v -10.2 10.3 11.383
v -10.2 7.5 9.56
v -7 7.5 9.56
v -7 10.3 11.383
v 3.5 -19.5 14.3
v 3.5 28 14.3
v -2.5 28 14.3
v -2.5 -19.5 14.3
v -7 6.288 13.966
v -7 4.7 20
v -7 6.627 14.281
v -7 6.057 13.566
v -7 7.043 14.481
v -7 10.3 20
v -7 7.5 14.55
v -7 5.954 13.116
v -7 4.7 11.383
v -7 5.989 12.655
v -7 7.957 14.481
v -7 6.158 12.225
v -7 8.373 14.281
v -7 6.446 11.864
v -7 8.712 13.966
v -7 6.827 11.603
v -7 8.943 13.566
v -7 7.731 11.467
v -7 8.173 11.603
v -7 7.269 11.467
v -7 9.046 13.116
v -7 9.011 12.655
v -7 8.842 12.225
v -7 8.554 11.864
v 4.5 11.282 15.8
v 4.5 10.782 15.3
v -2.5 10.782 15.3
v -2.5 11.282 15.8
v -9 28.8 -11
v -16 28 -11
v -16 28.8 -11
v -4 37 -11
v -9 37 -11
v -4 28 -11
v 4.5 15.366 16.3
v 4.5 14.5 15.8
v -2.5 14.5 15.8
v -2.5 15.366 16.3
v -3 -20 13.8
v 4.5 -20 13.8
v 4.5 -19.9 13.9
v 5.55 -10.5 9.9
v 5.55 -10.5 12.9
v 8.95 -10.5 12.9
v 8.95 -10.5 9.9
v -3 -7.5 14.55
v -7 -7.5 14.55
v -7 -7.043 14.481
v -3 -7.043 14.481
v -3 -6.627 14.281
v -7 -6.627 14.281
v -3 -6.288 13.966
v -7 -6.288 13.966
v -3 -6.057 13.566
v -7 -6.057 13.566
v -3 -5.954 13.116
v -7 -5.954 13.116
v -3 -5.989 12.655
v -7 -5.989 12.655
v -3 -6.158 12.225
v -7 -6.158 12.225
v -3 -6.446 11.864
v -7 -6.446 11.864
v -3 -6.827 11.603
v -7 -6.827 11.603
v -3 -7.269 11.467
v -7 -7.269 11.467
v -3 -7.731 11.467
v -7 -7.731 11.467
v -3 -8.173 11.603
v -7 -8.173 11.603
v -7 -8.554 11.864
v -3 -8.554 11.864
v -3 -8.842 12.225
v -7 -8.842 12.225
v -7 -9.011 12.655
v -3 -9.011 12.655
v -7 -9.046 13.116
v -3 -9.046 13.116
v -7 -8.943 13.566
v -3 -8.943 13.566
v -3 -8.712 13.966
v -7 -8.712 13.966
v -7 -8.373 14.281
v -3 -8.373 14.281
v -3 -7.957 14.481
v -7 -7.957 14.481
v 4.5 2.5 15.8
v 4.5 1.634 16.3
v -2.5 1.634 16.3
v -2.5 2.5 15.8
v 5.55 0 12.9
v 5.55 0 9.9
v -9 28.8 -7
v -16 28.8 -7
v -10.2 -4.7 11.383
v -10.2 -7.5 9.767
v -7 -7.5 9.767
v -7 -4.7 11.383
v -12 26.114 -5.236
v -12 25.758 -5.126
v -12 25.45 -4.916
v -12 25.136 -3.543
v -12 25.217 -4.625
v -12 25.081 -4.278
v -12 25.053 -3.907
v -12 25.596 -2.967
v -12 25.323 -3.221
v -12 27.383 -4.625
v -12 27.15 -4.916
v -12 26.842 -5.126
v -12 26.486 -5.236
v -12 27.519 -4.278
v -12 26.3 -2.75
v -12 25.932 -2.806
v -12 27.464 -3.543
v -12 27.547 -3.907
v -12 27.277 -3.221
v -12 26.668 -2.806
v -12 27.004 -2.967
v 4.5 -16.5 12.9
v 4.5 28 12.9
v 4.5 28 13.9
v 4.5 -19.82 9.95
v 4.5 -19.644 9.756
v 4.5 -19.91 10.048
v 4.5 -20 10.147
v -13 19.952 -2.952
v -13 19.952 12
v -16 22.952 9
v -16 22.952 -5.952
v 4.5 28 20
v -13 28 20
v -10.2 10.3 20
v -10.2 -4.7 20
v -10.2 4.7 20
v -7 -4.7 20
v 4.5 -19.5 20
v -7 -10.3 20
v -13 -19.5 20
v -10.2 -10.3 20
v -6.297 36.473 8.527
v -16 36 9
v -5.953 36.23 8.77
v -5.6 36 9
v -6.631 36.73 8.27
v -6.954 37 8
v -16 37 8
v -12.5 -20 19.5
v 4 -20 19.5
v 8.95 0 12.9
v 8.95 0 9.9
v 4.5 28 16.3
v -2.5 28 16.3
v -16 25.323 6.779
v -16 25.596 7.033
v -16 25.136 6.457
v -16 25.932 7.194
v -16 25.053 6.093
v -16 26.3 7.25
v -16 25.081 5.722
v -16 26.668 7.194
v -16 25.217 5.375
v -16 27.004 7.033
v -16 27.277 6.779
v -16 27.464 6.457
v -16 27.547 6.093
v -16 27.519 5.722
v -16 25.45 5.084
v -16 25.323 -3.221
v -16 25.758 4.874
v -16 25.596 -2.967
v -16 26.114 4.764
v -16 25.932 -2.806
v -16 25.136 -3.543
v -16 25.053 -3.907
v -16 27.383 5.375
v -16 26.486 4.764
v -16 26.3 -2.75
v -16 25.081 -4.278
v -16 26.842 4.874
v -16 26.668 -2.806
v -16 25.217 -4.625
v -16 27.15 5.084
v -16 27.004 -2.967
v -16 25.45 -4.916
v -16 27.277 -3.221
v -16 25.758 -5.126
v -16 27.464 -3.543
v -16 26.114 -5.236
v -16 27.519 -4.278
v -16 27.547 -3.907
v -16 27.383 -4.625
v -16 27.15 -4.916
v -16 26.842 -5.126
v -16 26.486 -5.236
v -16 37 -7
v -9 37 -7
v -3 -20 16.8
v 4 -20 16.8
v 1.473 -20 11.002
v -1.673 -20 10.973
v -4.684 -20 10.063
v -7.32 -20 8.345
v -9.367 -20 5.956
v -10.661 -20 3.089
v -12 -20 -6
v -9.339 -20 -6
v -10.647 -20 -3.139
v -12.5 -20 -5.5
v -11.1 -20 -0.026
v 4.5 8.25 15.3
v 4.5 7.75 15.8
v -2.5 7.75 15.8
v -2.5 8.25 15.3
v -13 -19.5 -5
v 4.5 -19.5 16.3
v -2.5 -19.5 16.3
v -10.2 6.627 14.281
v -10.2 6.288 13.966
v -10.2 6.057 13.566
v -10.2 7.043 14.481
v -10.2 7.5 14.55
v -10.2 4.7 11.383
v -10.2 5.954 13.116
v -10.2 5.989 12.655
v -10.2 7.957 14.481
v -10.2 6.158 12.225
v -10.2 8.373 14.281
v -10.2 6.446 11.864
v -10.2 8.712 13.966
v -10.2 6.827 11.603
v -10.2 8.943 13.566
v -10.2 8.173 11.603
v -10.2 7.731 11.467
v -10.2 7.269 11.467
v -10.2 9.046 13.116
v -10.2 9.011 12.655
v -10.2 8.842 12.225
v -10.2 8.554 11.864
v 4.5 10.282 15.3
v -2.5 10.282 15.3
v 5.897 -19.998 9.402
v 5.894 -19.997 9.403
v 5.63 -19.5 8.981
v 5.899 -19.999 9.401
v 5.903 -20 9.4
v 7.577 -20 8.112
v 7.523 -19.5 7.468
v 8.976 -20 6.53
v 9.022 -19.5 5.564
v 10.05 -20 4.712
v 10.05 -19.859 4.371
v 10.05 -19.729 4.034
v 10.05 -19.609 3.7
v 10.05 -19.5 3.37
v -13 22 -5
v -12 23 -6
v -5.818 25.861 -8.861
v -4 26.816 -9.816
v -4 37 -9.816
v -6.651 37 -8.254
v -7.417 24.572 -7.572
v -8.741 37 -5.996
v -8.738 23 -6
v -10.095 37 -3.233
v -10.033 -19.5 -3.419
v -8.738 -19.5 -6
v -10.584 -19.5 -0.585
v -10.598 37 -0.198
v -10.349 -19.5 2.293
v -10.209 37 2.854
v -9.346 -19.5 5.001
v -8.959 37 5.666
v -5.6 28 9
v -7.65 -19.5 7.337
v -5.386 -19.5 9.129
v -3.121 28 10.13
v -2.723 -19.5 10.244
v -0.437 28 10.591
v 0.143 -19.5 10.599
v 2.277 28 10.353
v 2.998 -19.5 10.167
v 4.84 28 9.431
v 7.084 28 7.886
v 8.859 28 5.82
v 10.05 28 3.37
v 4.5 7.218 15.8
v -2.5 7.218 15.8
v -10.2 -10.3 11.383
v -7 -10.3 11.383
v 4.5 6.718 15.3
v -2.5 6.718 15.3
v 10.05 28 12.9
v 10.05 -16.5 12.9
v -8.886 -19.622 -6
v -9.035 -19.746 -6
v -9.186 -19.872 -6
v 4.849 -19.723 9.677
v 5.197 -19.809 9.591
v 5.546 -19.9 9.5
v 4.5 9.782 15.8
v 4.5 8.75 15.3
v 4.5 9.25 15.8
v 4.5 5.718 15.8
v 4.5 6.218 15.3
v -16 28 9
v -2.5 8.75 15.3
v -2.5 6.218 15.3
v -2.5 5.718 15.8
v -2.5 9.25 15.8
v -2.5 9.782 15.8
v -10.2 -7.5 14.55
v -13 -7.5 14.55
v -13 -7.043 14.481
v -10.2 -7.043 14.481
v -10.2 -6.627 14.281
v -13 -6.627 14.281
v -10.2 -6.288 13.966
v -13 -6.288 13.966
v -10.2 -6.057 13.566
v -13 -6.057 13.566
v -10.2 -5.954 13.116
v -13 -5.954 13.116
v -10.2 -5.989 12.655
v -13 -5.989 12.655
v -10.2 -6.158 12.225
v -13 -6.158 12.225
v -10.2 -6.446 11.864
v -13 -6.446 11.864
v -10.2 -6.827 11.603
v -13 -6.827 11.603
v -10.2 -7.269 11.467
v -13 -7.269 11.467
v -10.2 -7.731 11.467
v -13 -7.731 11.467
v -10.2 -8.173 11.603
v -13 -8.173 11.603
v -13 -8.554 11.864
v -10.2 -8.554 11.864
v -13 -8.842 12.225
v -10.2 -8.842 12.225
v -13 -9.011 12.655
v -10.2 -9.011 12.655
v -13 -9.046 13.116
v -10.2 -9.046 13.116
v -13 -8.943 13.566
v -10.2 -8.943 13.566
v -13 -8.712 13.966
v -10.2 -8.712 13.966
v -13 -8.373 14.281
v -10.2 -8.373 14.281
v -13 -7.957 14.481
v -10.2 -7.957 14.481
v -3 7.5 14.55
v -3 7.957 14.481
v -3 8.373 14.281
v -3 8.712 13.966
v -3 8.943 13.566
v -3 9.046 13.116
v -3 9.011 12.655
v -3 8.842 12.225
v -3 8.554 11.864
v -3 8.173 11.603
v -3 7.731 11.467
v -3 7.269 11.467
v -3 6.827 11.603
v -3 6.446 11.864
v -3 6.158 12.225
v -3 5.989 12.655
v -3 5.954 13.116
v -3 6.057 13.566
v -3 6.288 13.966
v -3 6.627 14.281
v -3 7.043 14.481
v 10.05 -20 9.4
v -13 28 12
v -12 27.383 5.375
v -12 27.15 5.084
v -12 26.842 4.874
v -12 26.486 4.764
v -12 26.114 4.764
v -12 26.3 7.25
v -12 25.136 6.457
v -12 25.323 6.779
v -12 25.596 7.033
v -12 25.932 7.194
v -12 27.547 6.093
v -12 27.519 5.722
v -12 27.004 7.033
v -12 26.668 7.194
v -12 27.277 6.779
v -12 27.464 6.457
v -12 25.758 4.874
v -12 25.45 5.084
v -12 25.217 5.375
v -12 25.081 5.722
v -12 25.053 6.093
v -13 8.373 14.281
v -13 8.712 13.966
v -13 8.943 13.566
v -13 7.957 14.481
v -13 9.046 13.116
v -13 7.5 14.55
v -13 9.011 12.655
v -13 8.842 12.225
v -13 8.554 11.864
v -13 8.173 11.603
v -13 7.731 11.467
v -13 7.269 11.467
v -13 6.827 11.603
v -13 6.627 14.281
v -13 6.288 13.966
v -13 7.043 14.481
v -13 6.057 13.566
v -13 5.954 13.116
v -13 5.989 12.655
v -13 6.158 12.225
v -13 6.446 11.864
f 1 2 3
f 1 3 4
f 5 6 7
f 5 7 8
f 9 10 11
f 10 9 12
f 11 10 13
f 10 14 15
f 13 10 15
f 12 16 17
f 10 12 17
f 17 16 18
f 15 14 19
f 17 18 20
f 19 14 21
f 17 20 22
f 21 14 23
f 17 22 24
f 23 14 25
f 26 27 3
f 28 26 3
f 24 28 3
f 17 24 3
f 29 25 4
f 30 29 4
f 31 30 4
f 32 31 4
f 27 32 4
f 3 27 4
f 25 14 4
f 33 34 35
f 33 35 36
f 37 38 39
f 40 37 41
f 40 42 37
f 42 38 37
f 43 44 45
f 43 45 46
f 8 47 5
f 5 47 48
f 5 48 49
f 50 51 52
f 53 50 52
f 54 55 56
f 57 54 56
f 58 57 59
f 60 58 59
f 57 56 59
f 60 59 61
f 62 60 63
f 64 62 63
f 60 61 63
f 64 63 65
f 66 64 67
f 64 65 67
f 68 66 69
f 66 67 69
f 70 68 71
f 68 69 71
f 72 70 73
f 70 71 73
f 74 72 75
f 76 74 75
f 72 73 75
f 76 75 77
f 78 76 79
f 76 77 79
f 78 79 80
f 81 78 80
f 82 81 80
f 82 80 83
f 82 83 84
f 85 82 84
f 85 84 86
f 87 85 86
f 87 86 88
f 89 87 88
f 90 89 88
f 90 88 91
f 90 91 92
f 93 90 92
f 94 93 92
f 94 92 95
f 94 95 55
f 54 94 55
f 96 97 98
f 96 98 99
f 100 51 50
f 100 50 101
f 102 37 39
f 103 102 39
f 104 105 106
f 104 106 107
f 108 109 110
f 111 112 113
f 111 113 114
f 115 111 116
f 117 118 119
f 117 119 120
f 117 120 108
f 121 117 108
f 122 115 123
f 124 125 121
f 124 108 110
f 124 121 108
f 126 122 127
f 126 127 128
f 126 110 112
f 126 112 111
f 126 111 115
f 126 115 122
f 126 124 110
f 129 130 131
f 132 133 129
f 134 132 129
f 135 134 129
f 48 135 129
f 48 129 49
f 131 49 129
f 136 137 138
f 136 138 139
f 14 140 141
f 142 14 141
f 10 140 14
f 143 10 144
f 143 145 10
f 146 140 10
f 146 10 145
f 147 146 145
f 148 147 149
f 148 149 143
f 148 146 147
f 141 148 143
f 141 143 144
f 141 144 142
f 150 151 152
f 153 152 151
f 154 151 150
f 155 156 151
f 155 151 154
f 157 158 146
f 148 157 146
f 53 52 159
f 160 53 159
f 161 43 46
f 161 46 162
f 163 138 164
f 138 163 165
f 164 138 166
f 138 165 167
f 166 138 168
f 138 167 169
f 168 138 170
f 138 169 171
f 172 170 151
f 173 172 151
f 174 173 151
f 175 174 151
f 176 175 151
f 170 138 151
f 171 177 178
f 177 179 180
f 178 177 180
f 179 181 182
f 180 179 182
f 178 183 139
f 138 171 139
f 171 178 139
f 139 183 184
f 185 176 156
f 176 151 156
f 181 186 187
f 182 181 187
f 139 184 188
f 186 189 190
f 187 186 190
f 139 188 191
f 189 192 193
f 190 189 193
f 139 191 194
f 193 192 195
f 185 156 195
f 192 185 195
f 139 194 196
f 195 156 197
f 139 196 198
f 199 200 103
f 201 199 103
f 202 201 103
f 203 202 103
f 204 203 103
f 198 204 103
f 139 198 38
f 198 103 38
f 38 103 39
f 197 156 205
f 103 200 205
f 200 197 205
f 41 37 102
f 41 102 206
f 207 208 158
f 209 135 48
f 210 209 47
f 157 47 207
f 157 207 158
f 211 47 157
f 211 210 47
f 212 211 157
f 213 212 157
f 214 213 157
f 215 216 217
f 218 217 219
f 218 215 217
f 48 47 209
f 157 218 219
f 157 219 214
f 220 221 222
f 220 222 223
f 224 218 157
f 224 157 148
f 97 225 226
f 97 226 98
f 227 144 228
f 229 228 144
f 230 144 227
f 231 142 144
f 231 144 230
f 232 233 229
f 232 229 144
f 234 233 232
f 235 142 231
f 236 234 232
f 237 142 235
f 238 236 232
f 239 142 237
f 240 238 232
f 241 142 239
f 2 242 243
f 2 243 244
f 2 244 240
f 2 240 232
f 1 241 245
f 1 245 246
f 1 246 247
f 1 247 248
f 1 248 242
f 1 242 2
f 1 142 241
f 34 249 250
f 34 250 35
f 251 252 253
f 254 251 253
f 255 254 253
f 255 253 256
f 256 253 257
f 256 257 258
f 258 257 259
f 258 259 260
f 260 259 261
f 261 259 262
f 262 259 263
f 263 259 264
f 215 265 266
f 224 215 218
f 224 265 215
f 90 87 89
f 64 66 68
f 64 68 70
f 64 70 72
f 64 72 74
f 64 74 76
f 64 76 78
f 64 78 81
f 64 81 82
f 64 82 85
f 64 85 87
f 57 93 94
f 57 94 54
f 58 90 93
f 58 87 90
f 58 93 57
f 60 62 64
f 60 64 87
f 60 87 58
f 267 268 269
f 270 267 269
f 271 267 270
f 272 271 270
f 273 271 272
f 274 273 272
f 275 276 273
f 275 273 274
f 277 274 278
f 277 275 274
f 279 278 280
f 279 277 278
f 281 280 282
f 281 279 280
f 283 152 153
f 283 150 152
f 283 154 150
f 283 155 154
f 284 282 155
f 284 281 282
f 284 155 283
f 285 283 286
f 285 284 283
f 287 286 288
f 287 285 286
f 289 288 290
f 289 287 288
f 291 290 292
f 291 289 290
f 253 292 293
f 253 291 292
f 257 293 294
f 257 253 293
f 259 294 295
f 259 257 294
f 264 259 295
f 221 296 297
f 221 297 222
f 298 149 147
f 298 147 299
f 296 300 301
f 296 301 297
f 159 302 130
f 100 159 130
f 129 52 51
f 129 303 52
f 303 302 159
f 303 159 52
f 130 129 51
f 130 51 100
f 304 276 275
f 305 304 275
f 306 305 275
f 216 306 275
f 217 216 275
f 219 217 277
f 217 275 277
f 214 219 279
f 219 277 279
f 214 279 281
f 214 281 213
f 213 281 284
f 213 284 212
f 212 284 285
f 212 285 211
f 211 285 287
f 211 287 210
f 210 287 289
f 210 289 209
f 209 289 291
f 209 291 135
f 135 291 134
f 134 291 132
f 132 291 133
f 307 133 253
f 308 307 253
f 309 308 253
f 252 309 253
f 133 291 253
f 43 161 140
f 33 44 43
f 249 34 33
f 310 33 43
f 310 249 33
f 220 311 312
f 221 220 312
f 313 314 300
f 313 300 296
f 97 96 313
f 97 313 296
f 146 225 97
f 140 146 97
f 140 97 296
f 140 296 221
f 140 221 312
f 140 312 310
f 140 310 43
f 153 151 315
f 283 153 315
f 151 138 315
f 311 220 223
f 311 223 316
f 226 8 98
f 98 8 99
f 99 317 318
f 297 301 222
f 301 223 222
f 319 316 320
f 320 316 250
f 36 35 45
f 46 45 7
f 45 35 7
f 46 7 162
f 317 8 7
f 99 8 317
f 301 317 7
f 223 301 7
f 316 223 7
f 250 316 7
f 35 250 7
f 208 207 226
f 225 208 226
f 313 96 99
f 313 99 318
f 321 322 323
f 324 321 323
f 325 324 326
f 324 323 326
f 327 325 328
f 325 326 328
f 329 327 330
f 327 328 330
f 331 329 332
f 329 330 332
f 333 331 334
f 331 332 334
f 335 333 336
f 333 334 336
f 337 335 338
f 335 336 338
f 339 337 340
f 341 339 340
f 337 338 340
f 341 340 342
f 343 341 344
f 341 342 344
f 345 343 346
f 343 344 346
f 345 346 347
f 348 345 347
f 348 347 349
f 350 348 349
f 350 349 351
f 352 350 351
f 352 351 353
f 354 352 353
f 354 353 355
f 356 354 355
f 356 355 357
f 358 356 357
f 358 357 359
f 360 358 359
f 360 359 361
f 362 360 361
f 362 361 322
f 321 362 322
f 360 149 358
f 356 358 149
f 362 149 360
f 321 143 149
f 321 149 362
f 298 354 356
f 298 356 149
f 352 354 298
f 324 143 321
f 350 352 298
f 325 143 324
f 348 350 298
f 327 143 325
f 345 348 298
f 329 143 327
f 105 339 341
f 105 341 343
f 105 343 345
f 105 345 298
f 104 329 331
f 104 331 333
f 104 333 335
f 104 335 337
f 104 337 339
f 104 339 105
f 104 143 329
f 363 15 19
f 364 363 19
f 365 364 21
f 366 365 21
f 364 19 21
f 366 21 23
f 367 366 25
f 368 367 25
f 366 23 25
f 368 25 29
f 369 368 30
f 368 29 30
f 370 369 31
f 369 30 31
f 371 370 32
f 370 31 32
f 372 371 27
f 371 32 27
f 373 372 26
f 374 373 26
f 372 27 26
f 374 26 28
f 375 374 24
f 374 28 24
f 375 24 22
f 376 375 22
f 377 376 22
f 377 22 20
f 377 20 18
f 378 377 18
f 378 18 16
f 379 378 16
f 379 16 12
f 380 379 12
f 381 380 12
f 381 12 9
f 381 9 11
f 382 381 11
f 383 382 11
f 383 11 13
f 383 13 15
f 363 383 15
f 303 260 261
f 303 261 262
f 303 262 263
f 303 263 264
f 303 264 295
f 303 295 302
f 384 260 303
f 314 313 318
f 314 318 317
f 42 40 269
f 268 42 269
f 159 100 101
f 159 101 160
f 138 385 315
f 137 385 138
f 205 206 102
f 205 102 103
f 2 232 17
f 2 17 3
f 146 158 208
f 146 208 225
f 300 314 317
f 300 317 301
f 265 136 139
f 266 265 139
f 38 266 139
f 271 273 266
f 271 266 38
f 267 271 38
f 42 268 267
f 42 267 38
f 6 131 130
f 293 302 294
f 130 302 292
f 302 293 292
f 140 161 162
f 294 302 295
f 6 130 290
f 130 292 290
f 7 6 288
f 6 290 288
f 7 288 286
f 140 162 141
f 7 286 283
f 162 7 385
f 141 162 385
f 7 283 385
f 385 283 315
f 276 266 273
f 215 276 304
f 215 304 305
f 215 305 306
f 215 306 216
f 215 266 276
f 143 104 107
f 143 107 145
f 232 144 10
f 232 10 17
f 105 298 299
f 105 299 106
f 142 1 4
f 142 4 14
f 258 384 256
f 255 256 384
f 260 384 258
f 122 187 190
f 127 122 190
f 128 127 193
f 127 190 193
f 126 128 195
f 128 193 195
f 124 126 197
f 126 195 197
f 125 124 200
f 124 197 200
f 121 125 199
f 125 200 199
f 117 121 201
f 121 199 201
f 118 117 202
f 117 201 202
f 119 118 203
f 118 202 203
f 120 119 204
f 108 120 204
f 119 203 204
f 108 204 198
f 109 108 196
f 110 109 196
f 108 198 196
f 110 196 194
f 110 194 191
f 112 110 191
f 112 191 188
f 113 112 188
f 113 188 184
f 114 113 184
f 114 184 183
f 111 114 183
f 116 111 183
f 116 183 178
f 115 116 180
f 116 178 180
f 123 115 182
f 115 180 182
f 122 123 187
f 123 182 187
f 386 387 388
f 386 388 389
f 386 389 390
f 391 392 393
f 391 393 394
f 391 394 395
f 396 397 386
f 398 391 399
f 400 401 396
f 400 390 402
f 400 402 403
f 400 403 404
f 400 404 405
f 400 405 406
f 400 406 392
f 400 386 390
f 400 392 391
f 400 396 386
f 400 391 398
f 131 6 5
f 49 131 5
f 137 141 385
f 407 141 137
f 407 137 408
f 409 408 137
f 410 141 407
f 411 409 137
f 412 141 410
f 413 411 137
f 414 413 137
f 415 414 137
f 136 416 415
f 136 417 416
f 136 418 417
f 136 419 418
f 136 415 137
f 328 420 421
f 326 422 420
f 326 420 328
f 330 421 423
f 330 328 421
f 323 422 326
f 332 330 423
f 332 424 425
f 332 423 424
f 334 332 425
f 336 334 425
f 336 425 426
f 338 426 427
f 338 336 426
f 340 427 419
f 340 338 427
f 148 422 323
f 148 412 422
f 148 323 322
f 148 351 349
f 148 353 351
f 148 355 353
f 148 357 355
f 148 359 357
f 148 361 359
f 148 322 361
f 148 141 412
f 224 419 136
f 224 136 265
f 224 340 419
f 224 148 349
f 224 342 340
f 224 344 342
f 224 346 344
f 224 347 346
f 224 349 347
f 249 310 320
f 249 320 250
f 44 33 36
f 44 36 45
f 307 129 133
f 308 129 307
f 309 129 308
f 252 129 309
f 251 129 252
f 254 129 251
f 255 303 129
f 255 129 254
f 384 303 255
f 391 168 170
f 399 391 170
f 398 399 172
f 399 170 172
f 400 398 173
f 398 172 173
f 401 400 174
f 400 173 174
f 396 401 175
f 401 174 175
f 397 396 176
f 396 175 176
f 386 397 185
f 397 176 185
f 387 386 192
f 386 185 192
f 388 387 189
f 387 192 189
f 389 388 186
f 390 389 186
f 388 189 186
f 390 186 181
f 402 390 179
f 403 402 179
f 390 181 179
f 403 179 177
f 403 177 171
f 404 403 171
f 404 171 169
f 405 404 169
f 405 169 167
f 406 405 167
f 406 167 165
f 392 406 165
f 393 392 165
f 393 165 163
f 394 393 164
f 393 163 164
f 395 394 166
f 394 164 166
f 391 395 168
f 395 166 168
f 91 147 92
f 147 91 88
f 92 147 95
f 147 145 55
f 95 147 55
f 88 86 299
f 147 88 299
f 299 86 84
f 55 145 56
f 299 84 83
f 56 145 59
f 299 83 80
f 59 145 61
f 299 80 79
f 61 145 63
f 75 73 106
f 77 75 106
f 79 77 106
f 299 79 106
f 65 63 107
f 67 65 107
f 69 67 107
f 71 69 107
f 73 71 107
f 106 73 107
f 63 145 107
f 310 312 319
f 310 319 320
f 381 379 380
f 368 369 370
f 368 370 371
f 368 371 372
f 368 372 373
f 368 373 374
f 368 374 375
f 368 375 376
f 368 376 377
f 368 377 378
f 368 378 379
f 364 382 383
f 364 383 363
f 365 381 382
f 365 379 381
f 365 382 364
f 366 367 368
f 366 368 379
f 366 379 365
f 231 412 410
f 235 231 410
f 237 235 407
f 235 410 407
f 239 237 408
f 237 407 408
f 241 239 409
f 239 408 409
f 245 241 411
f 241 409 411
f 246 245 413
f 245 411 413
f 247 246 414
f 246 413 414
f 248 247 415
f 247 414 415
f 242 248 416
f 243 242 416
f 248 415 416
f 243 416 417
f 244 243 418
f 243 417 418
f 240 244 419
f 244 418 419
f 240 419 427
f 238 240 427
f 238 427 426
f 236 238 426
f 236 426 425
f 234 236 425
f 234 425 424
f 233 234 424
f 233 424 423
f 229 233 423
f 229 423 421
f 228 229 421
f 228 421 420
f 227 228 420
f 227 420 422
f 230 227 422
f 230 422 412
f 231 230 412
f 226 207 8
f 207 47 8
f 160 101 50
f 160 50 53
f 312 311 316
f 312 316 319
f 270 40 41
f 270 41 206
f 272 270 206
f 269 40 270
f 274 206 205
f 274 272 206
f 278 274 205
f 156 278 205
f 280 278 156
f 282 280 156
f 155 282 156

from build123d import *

# Parameters (mm, degrees)
BOSS_EXTRUDE1_DEPTH      = 37
BOSS_EXTRUDE1_DEPTH_BACK = 20
CUT_EXTRUDE5_DEPTH       = 7
CHAMFER2_SIZE            = 3.5
CHAMFER3_SIZE            = 0.5
SKETCH6_R                = 1.55
CUT_EXTRUDE6_DEPTH       = 10
CUT_EXTRUDE7_START       = -2.8
CUT_EXTRUDE7_DEPTH       = 3.2
CUT_EXTRUDE9_DEPTH       = 10
BOSS_EXTRUDE2_DEPTH      = 3
SKETCH10_W               = 7
SKETCH10_H               = 8.2
CUT_EXTRUDE10_DEPTH      = 4
SKETCH11_R               = 1.25
CUT_EXTRUDE11_DEPTH      = 4
CHAMFER4_SIZE            = 3
CUT_EXTRUDE12_DEPTH      = 9
CHAMFER5_SIZE            = 1
SKETCH14_W               = 3.4
SKETCH14_H               = 10.5
CUT_EXTRUDE13_DEPTH      = 3
CHAMFER6_SIZE            = 1
CHAMFER7_SIZE            = 0.4
CHAMFER7_SIZE2           = 1


# Some blends are built 0.0001 mm under size
with BuildPart() as part:
    # Sketch2 → Boss-Extrude1 (new, two sides: drawn at the far end of the back side and taken through both)
    with BuildSketch(Plane(origin=(0, 0, 0), x_dir=(1, 0, 0), z_dir=(0, 1, 0)).offset(-BOSS_EXTRUDE1_DEPTH_BACK)):
        with BuildLine():
            Line((10.05, -12.9), (4.5, -12.9))
            Line((4.5, -12.9), (4.5, -20))
            Line((4.5, -20), (-13, -20))
            Line((-13, -20), (-13, 11))
            Line((-13, 11), (-4, 11))
            Line((-4, 11), (-4, 9.816312953))
            ThreePointArc((-4, 9.816312953), (-7.25402814, -7.729105754), (10.05, -3.37008902))
            Line((10.05, -3.37008902), (10.05, -12.9))
        make_face()
    extrude(amount=BOSS_EXTRUDE1_DEPTH + BOSS_EXTRUDE1_DEPTH_BACK)

    # Sketch5 → Cut-Extrude5 (cut)
    with BuildSketch(Plane(origin=(4.5, 0, 0), x_dir=(0, 0, -1), z_dir=(1, 0, 0))):
        Polygon((-15.8, 5.718), (-15.3, 6.218), (-15.3, 6.718), (-15.8, 7.218), (-15.8, 7.75), (-15.3, 8.25), (-15.3, 8.75), (-15.8, 9.25), (-15.8, 9.782), (-15.3, 10.282), (-15.3, 10.782), (-15.8, 11.282), (-15.8, 14.5), (-16.3, 15.366025404), (-16.3, 37), (-14.3, 37), (-14.3, -20), (-16.3, -20), (-16.3, 1.633974596), (-15.8, 2.5), align=None)
    extrude(amount=-CUT_EXTRUDE5_DEPTH, mode=Mode.SUBTRACT)

    # Chamfer2
    # the kernel refuses this chamfer: 3.5 mm, written as the material it takes off along each edge
    with BuildSketch(Plane(origin=(19.050890458, -20, 12.9), x_dir=(0, 0.9996219169112968, 0.02749587661058662), z_dir=(-1, 0, 0))) as chamfer2_piece_1:
        Polygon((CHAMFER2_SIZE * 0.999621916911, CHAMFER2_SIZE * 0.0274958766106), (-CHAMFER2_SIZE * 0.0274958766106, CHAMFER2_SIZE * 0.999621916911), (0, 0), align=None)
    extrude(amount=14.550890458, mode=Mode.SUBTRACT)

    # Chamfer3
    # the kernel refuses this chamfer: 0.5 mm, written as the material it takes off along each edge
    with BuildSketch(Plane(origin=(-4, -20, -12.285841494), x_dir=(-0.9996219169112968, -0.0274958766105891, 0), z_dir=(0, 0, 1))) as chamfer3_piece_1:
        Polygon((CHAMFER3_SIZE * 0.999621916911, -CHAMFER3_SIZE * 0.0274958766106), (-CHAMFER3_SIZE * 0.0274958766106, -CHAMFER3_SIZE * 0.999621916911), (0, 0), align=None)
    extrude(amount=3.755370035, mode=Mode.SUBTRACT)
    with BuildSketch(Plane(origin=(0, -20, 0), x_dir=(-0.26232896064226713, 0, -0.9649785056716795), z_dir=(0.9649785056716795, 0, -0.26232896064226713))) as chamfer3_piece_2:
        Polygon((10.6 + CHAMFER3_SIZE, 0), (10.6, CHAMFER3_SIZE), (10.6, 0), align=None)
    revolve(axis=Axis((0, -20, 0), (0, 1, 0)), revolution_arc=196.87436844, mode=Mode.SUBTRACT)
    with BuildSketch(Plane(origin=(5.785841494, -20, 14.3), x_dir=(0, -0.0274958766105891, -0.9996219169112968), z_dir=(-1, 0, 0))) as chamfer3_piece_3:
        Polygon((CHAMFER3_SIZE * 0.999621916911, -CHAMFER3_SIZE * 0.0274958766106), (-CHAMFER3_SIZE * 0.0274958766106, -CHAMFER3_SIZE * 0.999621916911), (0, 0), align=None)
    extrude(amount=8.285841494, mode=Mode.SUBTRACT)
    with BuildSketch(Plane(origin=(-2.5, -20, 14.3), x_dir=(-0.9996219169112968, -0.027495876610589075, 0), z_dir=(0, 0, 1))) as chamfer3_piece_4:
        Polygon((CHAMFER3_SIZE * 0.999621916911, -CHAMFER3_SIZE * 0.0274958766106), (-CHAMFER3_SIZE * 0.0274958766106, -CHAMFER3_SIZE * 0.999621916911), (0, 0), align=None)
    extrude(amount=2, mode=Mode.SUBTRACT)
    with BuildSketch(Plane(origin=(5.785841494, -20, 16.3), x_dir=(0, -0.027495876610589005, 0.9996219169112968), z_dir=(-1, 0, 0))) as chamfer3_piece_5:
        Polygon((CHAMFER3_SIZE * 0.999621916911, CHAMFER3_SIZE * 0.0274958766106), (-CHAMFER3_SIZE * 0.0274958766106, CHAMFER3_SIZE * 0.999621916911), (0, 0), align=None)
    extrude(amount=8.285841494, mode=Mode.SUBTRACT)
    with BuildSketch(Plane(origin=(4.5, -20, 15.014158506), x_dir=(-0.9996219169112968, -0.027495876610589075, 0), z_dir=(0, 0, 1))) as chamfer3_piece_6:
        Polygon((CHAMFER3_SIZE * 0.999621916911, -CHAMFER3_SIZE * 0.0274958766106), (-CHAMFER3_SIZE * 0.0274958766106, -CHAMFER3_SIZE * 0.999621916911), (0, 0), align=None)
    extrude(amount=6.271682988, mode=Mode.SUBTRACT)
    with BuildSketch(Plane(origin=(5.785841494, -20, 20), x_dir=(0, -0.027495876610589005, -0.9996219169112968), z_dir=(-1, 0, 0))) as chamfer3_piece_7:
        Polygon((CHAMFER3_SIZE * 0.999621916911, -CHAMFER3_SIZE * 0.0274958766106), (-CHAMFER3_SIZE * 0.0274958766106, -CHAMFER3_SIZE * 0.999621916911), (0, 0), align=None)
    extrude(amount=20.071682988, mode=Mode.SUBTRACT)
    with BuildSketch(Plane(origin=(-13, -20, 21.285841494), x_dir=(0.9996219169112968, -0.0274958766105891, 0), z_dir=(0, 0, -1))) as chamfer3_piece_8:
        Polygon((CHAMFER3_SIZE * 0.999621916911, -CHAMFER3_SIZE * 0.0274958766106), (-CHAMFER3_SIZE * 0.0274958766106, -CHAMFER3_SIZE * 0.999621916911), (0, 0), align=None)
    extrude(amount=33.571682988, mode=Mode.SUBTRACT)
    with BuildSketch(Plane(origin=(-14.285841494, -20, -11), x_dir=(0, -0.0274958766105891, 0.9996219169112968), z_dir=(1, 0, 0))) as chamfer3_piece_9:
        Polygon((CHAMFER3_SIZE * 0.999621916911, -CHAMFER3_SIZE * 0.0274958766106), (-CHAMFER3_SIZE * 0.0274958766106, -CHAMFER3_SIZE * 0.999621916911), (0, 0), align=None)
    extrude(amount=11.571682988, mode=Mode.SUBTRACT)
    with BuildSketch(Plane(origin=(0, -20, 0), x_dir=(0.3514513132600512, 0, 0.9362061602060656), z_dir=(-0.9362061602060656, 0, 0.3514513132600512))) as chamfer3_piece_10:
        Polygon((10.6 + CHAMFER3_SIZE, 0), (10.6, CHAMFER3_SIZE), (10.6, 0), align=None)
    revolve(axis=Axis((0, -20, 0), (0, 1, 0)), revolution_arc=57.836903019, mode=Mode.SUBTRACT)
    with BuildSketch(Plane(origin=(5.785841494, -20, 14.3), x_dir=(0, -0.0274958766105891, -0.9996219169112968), z_dir=(-1, 0, 0))) as chamfer3_piece_11a_section:
        Polygon((CHAMFER3_SIZE * 0.999621916911, -CHAMFER3_SIZE * 0.0274958766106), (-CHAMFER3_SIZE * 0.0274958766106, -CHAMFER3_SIZE * 0.999621916911), (0, 0), align=None)
    chamfer3_piece_11a = extrude(amount=9.571682988, mode=Mode.PRIVATE)
    chamfer3_piece_11a = split(chamfer3_piece_11a, bisect_by=Plane(origin=(-2.5, -19.835103187, 14.135103187), z_dir=(-1, 0, 0)), keep=Keep.TOP, mode=Mode.PRIVATE)
    with BuildSketch(Plane(origin=(-2.5, -20, 13.014158506), x_dir=(-0.9996219169112968, -0.027495876610589075, 0), z_dir=(0, 0, 1))) as chamfer3_piece_11b_section:
        Polygon((CHAMFER3_SIZE * 0.999621916911, -CHAMFER3_SIZE * 0.0274958766106), (-CHAMFER3_SIZE * 0.0274958766106, -CHAMFER3_SIZE * 0.999621916911), (0, 0), align=None)
    chamfer3_piece_11b = extrude(amount=3.285841494, mode=Mode.PRIVATE)
    chamfer3_piece_11b = split(chamfer3_piece_11b, bisect_by=Plane(origin=(-2.664896813, -19.835103187, 14.3), z_dir=(0, 0, -1)), keep=Keep.TOP, mode=Mode.PRIVATE)
    chamfer3_piece_11 = chamfer3_piece_11a & chamfer3_piece_11b
    add(chamfer3_piece_11, mode=Mode.SUBTRACT)
    with BuildSketch(Plane(origin=(-2.5, -20, 14.3), x_dir=(-0.9996219169112968, -0.027495876610589075, 0), z_dir=(0, 0, 1))) as chamfer3_piece_12a_section:
        Polygon((CHAMFER3_SIZE * 0.999621916911, -CHAMFER3_SIZE * 0.0274958766106), (-CHAMFER3_SIZE * 0.0274958766106, -CHAMFER3_SIZE * 0.999621916911), (0, 0), align=None)
    chamfer3_piece_12a = extrude(amount=3.285841494, mode=Mode.PRIVATE)
    chamfer3_piece_12a = split(chamfer3_piece_12a, bisect_by=Plane(origin=(-2.664896813, -19.835103187, 16.3), z_dir=(0, 0, 1)), keep=Keep.TOP, mode=Mode.PRIVATE)
    with BuildSketch(Plane(origin=(5.785841494, -20, 16.3), x_dir=(0, -0.027495876610589005, 0.9996219169112968), z_dir=(-1, 0, 0))) as chamfer3_piece_12b_section:
        Polygon((CHAMFER3_SIZE * 0.999621916911, CHAMFER3_SIZE * 0.0274958766106), (-CHAMFER3_SIZE * 0.0274958766106, CHAMFER3_SIZE * 0.999621916911), (0, 0), align=None)
    chamfer3_piece_12b = extrude(amount=9.571682988, mode=Mode.PRIVATE)
    chamfer3_piece_12b = split(chamfer3_piece_12b, bisect_by=Plane(origin=(-2.5, -19.835103187, 16.464896813), z_dir=(-1, 0, 0)), keep=Keep.TOP, mode=Mode.PRIVATE)
    chamfer3_piece_12 = chamfer3_piece_12a & chamfer3_piece_12b
    add(chamfer3_piece_12, mode=Mode.SUBTRACT)

    # Sketch6 → Cut-Extrude6 (cut)
    with BuildSketch(Plane.ZY.offset(13)):
        with Locations((13, 7.5)):
            Circle(SKETCH6_R)
        with Locations((13, -7.5)):
            Circle(SKETCH6_R)
    extrude(amount=-CUT_EXTRUDE6_DEPTH, mode=Mode.SUBTRACT)

    # Sketch7 → Cut-Extrude7 (cut)
    with BuildSketch(Plane.ZY.offset(13).offset(CUT_EXTRUDE7_START)):
        Polygon((21.967267325, -4.7), (21.967267325, -10.3), (11.383419246, -10.3), (9.766838493, -7.5), (11.383419246, -4.7), align=None)
        Polygon((11.383419246, 4.7), (9.559772236, 7.5), (11.383419246, 10.3), (21.967267325, 10.3), (21.967267325, 4.7), align=None)
    extrude(amount=-CUT_EXTRUDE7_DEPTH, mode=Mode.SUBTRACT)

    # Sketch9 → Cut-Extrude9 (cut)
    with BuildSketch(Plane.ZY.offset(13)):
        Polygon((-11, 28), (-6, 23), (-6, -20), (-11, -20), align=None)
    extrude(amount=-CUT_EXTRUDE9_DEPTH, mode=Mode.SUBTRACT)

    # Sketch12 → Boss-Extrude2 (add)
    with BuildSketch(Plane.ZY.offset(13)):
        Polygon((9, 37), (9, 22.951792944), (-5.951792944, 22.951792944), (-11, 28), (-11, 37), align=None)
    extrude(amount=BOSS_EXTRUDE2_DEPTH)

    # Sketch10 → Cut-Extrude10 (cut)
    with BuildSketch(Plane(origin=(0, 0, -11), x_dir=(-1, 0, 0), z_dir=(0, 0, -1))):
        with Locations((12.5, 32.9)):
            Rectangle(SKETCH10_W, SKETCH10_H)
    extrude(amount=-CUT_EXTRUDE10_DEPTH, mode=Mode.SUBTRACT)

    # Sketch11 → Cut-Extrude11 (cut)
    with BuildSketch(Plane.ZY.offset(16)):
        with Locations((-4, 26.3)):
            Circle(SKETCH11_R)
        with Locations((6, 26.3)):
            Circle(SKETCH11_R)
    extrude(amount=-CUT_EXTRUDE11_DEPTH, mode=Mode.SUBTRACT)

    # Chamfer4
    chamfer4_edges = [part.edges().sort_by_distance(p)[0] for p in [
        (-13, 29.975896472, 9),
        (-13, 22.951792944, 1.524103528),
    ]]
    chamfer(chamfer4_edges, length=CHAMFER4_SIZE - 0.0001)  # a hair under: the kernel refuses the full size

    # Sketch13 → Cut-Extrude12 (cut)
    with BuildSketch(Plane(origin=(0, 37, 0), x_dir=(1, 0, 0), z_dir=(0, 1, 0))):
        Polygon((-16, -9), (0, -9), (0, 6.411173943), (12, 6.411173943), (12, -20), (-16, -20), align=None)
    extrude(amount=-CUT_EXTRUDE12_DEPTH, mode=Mode.SUBTRACT)

    # Chamfer5
    chamfer5_edges = [part.edges().sort_by_distance(p)[0] for p in [
        (-10.8, 37, 9),
    ]]
    chamfer(chamfer5_edges, length=CHAMFER5_SIZE)

    # Sketch14 → Cut-Extrude13 (cut)
    with BuildSketch(Plane.XY.offset(12.9)):
        with Locations((7.25, -5.25)):
            Rectangle(SKETCH14_W, SKETCH14_H)
    extrude(amount=-CUT_EXTRUDE13_DEPTH, mode=Mode.SUBTRACT)

    # Chamfer6
    chamfer6_edges = [part.edges().sort_by_distance(p)[0] for p in [
        (-13, 1.75, -6),
    ]]
    chamfer(chamfer6_edges, length=CHAMFER6_SIZE)

    # Chamfer7
    chamfer7_edges = [part.edges().sort_by_distance(p)[0] for p in [
        (4.5, 4.25, 14.3),
    ]]
    chamfer7_side = [part.faces().sort_by_distance(p)[0] for p in [
        (4.5, 2.170208938, 13.449589105),
    ]]
    chamfer(chamfer7_edges, length=CHAMFER7_SIZE, length2=CHAMFER7_SIZE2, reference=chamfer7_side[0])


solid = part.part
